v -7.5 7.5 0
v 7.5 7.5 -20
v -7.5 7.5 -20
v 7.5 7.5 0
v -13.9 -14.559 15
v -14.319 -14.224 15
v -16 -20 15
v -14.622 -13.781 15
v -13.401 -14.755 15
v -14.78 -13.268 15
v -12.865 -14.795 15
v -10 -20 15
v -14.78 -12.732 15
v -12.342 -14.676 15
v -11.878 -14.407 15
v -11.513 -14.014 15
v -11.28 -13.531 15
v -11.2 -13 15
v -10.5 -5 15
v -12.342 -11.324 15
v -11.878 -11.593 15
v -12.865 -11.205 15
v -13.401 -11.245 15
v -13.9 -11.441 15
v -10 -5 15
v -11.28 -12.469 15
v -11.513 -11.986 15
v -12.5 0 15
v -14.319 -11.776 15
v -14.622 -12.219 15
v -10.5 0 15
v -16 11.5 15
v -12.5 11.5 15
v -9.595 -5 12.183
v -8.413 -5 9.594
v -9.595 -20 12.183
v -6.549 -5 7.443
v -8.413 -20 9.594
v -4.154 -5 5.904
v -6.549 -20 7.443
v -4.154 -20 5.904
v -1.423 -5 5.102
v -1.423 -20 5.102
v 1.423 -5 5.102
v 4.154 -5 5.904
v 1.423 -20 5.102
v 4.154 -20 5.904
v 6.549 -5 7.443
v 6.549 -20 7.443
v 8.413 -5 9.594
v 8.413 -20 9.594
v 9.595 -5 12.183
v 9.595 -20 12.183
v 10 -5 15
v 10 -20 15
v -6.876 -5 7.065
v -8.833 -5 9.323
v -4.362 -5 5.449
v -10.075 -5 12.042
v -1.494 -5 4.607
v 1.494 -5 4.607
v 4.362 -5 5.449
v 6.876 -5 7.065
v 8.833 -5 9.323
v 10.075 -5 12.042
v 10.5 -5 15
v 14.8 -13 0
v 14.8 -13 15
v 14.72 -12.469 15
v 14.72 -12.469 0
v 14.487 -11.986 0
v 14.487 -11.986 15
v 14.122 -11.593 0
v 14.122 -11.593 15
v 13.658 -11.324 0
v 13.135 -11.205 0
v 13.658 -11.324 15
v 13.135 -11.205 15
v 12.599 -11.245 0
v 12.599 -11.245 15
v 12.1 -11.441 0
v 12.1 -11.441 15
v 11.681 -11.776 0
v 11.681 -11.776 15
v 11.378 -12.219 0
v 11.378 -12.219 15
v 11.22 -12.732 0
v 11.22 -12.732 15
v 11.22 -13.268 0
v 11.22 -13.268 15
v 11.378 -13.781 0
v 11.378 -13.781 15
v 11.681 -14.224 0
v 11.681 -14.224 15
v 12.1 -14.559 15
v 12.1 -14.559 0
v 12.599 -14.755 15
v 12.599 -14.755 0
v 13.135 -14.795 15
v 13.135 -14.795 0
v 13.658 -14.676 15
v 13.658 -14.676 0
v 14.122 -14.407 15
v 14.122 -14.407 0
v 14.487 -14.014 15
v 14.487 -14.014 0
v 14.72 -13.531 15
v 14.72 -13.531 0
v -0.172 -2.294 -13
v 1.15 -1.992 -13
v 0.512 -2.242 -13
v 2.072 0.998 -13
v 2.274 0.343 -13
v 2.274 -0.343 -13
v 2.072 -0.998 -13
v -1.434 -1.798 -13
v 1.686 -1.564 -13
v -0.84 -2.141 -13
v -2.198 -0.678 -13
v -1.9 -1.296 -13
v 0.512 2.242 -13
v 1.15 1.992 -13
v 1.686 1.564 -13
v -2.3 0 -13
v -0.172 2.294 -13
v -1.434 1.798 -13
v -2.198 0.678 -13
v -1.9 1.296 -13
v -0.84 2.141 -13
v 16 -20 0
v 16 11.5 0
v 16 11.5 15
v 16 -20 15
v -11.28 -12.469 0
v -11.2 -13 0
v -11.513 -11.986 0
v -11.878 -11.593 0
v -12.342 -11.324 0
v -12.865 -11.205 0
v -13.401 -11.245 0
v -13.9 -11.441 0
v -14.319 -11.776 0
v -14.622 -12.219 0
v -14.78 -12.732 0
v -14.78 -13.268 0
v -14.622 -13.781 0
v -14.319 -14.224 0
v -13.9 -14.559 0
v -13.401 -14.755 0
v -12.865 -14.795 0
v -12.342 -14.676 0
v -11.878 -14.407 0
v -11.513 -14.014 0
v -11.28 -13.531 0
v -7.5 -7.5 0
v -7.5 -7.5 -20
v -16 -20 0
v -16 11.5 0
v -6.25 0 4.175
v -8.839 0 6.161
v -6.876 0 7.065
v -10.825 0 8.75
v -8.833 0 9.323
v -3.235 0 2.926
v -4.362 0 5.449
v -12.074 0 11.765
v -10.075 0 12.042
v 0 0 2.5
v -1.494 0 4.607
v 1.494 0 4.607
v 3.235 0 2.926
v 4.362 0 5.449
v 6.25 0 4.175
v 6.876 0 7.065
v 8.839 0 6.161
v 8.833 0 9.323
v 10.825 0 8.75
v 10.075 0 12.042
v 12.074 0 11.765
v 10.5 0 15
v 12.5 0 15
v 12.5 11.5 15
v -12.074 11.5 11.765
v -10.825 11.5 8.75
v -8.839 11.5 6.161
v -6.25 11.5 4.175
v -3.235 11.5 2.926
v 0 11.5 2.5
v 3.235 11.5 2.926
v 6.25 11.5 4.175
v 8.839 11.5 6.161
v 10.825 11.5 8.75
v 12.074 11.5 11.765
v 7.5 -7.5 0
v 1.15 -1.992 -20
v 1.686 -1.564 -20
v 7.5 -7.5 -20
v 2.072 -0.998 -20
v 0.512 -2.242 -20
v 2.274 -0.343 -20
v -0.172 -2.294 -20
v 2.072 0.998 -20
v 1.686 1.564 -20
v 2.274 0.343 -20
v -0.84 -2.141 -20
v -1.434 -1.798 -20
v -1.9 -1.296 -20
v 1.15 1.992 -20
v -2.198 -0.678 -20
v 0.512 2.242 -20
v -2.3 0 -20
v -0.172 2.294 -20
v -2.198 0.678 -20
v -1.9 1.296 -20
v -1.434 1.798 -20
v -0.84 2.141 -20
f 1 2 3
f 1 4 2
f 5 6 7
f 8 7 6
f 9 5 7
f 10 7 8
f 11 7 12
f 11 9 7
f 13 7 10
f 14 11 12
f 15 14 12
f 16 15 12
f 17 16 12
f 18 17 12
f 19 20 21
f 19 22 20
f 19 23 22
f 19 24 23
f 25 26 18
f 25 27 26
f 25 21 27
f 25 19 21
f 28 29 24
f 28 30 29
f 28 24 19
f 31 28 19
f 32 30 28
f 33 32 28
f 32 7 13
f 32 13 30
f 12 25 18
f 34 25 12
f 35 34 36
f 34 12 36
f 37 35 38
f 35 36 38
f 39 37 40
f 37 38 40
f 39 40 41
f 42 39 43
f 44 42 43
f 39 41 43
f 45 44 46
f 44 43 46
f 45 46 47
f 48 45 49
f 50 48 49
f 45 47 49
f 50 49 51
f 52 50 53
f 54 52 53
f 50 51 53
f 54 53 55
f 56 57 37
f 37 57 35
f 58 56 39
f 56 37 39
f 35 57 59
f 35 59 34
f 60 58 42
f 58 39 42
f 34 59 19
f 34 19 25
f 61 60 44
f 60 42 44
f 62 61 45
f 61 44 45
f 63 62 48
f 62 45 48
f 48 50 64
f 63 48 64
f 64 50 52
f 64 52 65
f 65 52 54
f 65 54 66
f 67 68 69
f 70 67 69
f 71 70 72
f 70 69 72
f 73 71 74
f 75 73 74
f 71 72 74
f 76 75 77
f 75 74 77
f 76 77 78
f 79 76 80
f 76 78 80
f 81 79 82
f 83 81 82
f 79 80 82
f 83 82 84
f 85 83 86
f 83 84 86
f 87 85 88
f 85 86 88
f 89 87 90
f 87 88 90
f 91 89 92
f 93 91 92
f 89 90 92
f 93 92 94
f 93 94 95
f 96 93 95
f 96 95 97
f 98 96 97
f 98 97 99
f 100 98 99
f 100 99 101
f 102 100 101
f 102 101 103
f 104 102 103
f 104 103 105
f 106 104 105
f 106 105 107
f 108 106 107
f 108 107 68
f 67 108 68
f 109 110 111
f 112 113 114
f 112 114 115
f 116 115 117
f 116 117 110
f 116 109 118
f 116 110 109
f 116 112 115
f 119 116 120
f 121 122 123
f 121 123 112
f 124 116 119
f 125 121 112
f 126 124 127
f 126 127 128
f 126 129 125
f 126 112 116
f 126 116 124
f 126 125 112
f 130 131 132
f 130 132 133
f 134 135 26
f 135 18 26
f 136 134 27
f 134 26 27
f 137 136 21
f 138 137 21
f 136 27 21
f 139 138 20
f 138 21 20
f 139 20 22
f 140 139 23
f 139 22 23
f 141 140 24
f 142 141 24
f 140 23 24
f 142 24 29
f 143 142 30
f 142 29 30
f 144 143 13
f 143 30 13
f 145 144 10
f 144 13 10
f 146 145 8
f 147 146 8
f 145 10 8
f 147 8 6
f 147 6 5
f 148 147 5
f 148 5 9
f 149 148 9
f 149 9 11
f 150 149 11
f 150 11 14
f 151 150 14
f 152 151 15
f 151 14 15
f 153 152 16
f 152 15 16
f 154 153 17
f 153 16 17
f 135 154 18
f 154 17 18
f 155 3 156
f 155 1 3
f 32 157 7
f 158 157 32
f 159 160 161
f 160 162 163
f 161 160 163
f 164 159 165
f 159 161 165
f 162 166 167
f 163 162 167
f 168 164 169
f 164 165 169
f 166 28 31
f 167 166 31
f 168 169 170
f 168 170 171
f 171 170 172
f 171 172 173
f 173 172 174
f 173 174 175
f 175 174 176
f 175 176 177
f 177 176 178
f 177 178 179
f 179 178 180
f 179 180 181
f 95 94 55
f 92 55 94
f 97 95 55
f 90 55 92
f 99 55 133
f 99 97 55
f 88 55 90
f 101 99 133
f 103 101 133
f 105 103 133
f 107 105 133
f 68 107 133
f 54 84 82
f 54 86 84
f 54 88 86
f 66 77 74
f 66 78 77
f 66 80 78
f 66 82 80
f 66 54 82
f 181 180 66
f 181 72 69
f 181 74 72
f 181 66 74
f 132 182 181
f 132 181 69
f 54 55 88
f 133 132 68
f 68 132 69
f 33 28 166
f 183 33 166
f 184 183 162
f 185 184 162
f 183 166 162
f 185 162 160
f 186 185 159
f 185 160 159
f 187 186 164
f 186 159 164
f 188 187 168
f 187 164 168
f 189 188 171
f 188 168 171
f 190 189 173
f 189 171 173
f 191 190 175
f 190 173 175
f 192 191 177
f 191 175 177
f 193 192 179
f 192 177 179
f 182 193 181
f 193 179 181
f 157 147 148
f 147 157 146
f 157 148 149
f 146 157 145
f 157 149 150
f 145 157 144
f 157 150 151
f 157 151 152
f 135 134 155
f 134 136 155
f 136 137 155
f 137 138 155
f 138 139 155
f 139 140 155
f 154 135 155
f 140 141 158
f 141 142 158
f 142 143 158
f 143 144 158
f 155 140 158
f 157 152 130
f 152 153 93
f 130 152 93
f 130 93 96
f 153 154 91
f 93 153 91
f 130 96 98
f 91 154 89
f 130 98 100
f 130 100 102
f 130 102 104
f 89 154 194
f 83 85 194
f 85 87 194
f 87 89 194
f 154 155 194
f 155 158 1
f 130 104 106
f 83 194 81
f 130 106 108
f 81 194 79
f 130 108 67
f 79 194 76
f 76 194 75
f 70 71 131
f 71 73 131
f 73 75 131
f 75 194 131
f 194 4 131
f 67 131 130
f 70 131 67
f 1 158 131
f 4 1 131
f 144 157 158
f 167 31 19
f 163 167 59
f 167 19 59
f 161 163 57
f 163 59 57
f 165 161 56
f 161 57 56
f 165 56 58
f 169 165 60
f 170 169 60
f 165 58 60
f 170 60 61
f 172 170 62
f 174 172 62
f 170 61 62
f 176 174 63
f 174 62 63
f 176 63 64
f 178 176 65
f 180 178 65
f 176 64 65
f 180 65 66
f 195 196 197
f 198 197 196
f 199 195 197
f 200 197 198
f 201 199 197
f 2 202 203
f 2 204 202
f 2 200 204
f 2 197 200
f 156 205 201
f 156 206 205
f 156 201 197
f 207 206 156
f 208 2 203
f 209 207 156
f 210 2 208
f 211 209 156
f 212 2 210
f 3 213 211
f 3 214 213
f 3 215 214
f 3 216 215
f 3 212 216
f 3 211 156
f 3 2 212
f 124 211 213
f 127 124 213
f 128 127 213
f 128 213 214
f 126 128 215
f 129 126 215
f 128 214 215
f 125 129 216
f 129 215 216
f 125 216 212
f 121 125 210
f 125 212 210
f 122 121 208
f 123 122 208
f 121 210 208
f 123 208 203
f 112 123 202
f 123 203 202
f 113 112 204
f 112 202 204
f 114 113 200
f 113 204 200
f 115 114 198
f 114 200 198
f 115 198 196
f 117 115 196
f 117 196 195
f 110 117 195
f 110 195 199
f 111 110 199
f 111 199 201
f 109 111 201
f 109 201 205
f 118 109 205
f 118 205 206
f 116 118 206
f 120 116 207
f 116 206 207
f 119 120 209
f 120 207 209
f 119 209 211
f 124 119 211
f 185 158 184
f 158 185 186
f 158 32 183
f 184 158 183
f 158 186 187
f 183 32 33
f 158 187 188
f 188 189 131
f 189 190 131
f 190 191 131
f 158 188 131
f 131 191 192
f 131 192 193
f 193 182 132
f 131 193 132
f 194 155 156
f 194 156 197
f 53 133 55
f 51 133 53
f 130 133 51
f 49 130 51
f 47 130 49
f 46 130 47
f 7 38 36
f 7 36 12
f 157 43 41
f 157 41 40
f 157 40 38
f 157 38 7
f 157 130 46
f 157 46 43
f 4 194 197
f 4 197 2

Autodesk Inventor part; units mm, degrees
ref_plane "YZ Plane" through (0, 0, 0) normal (1, 0, 0) x (0, 1, 0)
ref_plane "XZ Plane" through (0, 0, 0) normal (0, 1, 0) x (-1, 0, 0)
ref_plane "XY Plane" through (0, 0, 0) normal (0, 0, 1) x (1, 0, 0)
sketch "Skizze1" plane through (0, 0, 0) normal (0, 0, 1) x (1, 0, 0)
  line L0 (-16, 20) -> (16, 20)
  line L1 (16, 20) -> (16, -20)
  line L2 (16, -20) -> (-16, -20)
  line L3 (-16, -20) -> (-16, 20)
  line L4 (-16, 20) -> (16, -20) construction
  line L5 (16, 20) -> (-16, -20) construction
  point P0 (0, 0)
  dimension "d0" = 32
  dimension "d1" = 40
extrude "Extrusion1" add sketch "Skizze1" along normal blind 15
sketch "Skizze2" plane through (-16, -20, 0) normal (0, -1, 0) x (1, 0, 0)
  line L0 (0, 15) -> (32, 15) projected
  line L1 (0, 0) -> (0, 15) projected
  line L2 (32, 0) -> (0, 0) projected
  line L3 (32, 0) -> (32, 15) projected
  line L4 (32, 15) -> (0, 15) projected
  circle A0 centre (16, 15) radius 10
  point P0 (16, 0)
  dimension "d4" = 20
extrude "Extrusion2" cut sketch "Skizze2" against normal blind 15 contours A0 L0 | L0 A0
sketch "Skizze3" plane through (-16, -5, 0) normal (0, -1, 0) x (1, 0, 0)
  line L0 (0, 0) -> (0, 15) projected
  line L1 (32, 0) -> (0, 0) projected
  line L2 (32, 0) -> (32, 15) projected
  line L3 (26, 15) -> (32, 15) projected
  line L4 (0, 15) -> (6, 15) projected
  line L5 (6, 15) -> (26, 15) projected
  circle A0 centre (16, 15) radius 10.5
  point P0 (16, 0)
  dimension "d7" = 21
extrude "Extrusion3" cut sketch "Skizze3" against normal blind 5 contours A0 L3 L5 L4 | L4 L5 L3 A0
sketch "Skizze4" plane through (-16, 0, 0) normal (0, -1, 0) x (1, 0, 0)
  line L0 (5.5, 15) -> (26.5, 15) projected
  circle A0 centre (16, 15) radius 12.5
  point P0 (16, 0)
  dimension "d10" = 25
extrude "Extrusion4" cut sketch "Skizze4" against normal through all
sketch "Skizze5" plane through (0, 0, 15) normal (0, 0, 1) x (1, 0, 0)
  line L0 (-16, 20) -> (-16, -20) projected
  line L1 (-16, -20) -> (-10, -20) projected
  line L2 (-10, -20) -> (-10, -5) projected
  line L3 (10, -5) -> (10, -20) projected
  line L4 (10, -20) -> (16, -20) projected
  line L5 (16, -20) -> (16, 20) projected
  circle A0 centre (-13, -13) radius 1.8
  circle A1 centre (13, -13) radius 1.8
  point P0 (0, 0)
  dimension "d13" = 3.6
  dimension "d14" = 3.6
  dimension "d15" = 7
  dimension "d16" = 7
  dimension "d17" = 3
  dimension "d18" = 3
extrude "Extrusion5" cut sketch "Skizze5" against normal through all
sketch "Skizze6" plane through (0, 0, 0) normal (0, 0, -1) x (-1, 0, 0)
  line L0 (-7.5, 7.5) -> (7.5, 7.5)
  line L1 (7.5, 7.5) -> (7.5, -7.5)
  line L2 (7.5, -7.5) -> (-7.5, -7.5)
  line L3 (-7.5, -7.5) -> (-7.5, 7.5)
  line L4 (-7.5, 7.5) -> (7.5, -7.5) construction
  line L5 (7.5, 7.5) -> (-7.5, -7.5) construction
  point P0 (0, 0)
  dimension "d21" = 15
  dimension "d22" = 15
extrude "Extrusion6" add sketch "Skizze6" along normal blind 20
sketch "Skizze7" plane through (0, 0, -20) normal (0, 0, -1) x (-1, 0, 0)
  circle A0 centre (0, 0) radius 2.3
  dimension "d25" = 4.6
extrude "Extrusion7" cut sketch "Skizze7" against normal blind 7
sketch "Skizze8" plane through (0, 0, 0) normal (0, 0, -1) x (-1, 0, 0)
  line L0 (12.5, 20) -> (16, 20) projected
  line L1 (16, 20) -> (16, 11.5)
  line L2 (16, 20) -> (16, -20) projected
  line L3 (16, 11.5) -> (-16, 11.5)
  line L4 (-16, 20) -> (-16, -20) projected
  line L5 (16, 20) -> (-16, 20) projected
  line L6 (-16, 20) -> (16, 20)
  point P0 (0, 0)
  dimension "d28" = 8.5
extrude "Extrusion8" cut sketch "Skizze8" along normal mid plane 58.75
properties part number "unterteil"
